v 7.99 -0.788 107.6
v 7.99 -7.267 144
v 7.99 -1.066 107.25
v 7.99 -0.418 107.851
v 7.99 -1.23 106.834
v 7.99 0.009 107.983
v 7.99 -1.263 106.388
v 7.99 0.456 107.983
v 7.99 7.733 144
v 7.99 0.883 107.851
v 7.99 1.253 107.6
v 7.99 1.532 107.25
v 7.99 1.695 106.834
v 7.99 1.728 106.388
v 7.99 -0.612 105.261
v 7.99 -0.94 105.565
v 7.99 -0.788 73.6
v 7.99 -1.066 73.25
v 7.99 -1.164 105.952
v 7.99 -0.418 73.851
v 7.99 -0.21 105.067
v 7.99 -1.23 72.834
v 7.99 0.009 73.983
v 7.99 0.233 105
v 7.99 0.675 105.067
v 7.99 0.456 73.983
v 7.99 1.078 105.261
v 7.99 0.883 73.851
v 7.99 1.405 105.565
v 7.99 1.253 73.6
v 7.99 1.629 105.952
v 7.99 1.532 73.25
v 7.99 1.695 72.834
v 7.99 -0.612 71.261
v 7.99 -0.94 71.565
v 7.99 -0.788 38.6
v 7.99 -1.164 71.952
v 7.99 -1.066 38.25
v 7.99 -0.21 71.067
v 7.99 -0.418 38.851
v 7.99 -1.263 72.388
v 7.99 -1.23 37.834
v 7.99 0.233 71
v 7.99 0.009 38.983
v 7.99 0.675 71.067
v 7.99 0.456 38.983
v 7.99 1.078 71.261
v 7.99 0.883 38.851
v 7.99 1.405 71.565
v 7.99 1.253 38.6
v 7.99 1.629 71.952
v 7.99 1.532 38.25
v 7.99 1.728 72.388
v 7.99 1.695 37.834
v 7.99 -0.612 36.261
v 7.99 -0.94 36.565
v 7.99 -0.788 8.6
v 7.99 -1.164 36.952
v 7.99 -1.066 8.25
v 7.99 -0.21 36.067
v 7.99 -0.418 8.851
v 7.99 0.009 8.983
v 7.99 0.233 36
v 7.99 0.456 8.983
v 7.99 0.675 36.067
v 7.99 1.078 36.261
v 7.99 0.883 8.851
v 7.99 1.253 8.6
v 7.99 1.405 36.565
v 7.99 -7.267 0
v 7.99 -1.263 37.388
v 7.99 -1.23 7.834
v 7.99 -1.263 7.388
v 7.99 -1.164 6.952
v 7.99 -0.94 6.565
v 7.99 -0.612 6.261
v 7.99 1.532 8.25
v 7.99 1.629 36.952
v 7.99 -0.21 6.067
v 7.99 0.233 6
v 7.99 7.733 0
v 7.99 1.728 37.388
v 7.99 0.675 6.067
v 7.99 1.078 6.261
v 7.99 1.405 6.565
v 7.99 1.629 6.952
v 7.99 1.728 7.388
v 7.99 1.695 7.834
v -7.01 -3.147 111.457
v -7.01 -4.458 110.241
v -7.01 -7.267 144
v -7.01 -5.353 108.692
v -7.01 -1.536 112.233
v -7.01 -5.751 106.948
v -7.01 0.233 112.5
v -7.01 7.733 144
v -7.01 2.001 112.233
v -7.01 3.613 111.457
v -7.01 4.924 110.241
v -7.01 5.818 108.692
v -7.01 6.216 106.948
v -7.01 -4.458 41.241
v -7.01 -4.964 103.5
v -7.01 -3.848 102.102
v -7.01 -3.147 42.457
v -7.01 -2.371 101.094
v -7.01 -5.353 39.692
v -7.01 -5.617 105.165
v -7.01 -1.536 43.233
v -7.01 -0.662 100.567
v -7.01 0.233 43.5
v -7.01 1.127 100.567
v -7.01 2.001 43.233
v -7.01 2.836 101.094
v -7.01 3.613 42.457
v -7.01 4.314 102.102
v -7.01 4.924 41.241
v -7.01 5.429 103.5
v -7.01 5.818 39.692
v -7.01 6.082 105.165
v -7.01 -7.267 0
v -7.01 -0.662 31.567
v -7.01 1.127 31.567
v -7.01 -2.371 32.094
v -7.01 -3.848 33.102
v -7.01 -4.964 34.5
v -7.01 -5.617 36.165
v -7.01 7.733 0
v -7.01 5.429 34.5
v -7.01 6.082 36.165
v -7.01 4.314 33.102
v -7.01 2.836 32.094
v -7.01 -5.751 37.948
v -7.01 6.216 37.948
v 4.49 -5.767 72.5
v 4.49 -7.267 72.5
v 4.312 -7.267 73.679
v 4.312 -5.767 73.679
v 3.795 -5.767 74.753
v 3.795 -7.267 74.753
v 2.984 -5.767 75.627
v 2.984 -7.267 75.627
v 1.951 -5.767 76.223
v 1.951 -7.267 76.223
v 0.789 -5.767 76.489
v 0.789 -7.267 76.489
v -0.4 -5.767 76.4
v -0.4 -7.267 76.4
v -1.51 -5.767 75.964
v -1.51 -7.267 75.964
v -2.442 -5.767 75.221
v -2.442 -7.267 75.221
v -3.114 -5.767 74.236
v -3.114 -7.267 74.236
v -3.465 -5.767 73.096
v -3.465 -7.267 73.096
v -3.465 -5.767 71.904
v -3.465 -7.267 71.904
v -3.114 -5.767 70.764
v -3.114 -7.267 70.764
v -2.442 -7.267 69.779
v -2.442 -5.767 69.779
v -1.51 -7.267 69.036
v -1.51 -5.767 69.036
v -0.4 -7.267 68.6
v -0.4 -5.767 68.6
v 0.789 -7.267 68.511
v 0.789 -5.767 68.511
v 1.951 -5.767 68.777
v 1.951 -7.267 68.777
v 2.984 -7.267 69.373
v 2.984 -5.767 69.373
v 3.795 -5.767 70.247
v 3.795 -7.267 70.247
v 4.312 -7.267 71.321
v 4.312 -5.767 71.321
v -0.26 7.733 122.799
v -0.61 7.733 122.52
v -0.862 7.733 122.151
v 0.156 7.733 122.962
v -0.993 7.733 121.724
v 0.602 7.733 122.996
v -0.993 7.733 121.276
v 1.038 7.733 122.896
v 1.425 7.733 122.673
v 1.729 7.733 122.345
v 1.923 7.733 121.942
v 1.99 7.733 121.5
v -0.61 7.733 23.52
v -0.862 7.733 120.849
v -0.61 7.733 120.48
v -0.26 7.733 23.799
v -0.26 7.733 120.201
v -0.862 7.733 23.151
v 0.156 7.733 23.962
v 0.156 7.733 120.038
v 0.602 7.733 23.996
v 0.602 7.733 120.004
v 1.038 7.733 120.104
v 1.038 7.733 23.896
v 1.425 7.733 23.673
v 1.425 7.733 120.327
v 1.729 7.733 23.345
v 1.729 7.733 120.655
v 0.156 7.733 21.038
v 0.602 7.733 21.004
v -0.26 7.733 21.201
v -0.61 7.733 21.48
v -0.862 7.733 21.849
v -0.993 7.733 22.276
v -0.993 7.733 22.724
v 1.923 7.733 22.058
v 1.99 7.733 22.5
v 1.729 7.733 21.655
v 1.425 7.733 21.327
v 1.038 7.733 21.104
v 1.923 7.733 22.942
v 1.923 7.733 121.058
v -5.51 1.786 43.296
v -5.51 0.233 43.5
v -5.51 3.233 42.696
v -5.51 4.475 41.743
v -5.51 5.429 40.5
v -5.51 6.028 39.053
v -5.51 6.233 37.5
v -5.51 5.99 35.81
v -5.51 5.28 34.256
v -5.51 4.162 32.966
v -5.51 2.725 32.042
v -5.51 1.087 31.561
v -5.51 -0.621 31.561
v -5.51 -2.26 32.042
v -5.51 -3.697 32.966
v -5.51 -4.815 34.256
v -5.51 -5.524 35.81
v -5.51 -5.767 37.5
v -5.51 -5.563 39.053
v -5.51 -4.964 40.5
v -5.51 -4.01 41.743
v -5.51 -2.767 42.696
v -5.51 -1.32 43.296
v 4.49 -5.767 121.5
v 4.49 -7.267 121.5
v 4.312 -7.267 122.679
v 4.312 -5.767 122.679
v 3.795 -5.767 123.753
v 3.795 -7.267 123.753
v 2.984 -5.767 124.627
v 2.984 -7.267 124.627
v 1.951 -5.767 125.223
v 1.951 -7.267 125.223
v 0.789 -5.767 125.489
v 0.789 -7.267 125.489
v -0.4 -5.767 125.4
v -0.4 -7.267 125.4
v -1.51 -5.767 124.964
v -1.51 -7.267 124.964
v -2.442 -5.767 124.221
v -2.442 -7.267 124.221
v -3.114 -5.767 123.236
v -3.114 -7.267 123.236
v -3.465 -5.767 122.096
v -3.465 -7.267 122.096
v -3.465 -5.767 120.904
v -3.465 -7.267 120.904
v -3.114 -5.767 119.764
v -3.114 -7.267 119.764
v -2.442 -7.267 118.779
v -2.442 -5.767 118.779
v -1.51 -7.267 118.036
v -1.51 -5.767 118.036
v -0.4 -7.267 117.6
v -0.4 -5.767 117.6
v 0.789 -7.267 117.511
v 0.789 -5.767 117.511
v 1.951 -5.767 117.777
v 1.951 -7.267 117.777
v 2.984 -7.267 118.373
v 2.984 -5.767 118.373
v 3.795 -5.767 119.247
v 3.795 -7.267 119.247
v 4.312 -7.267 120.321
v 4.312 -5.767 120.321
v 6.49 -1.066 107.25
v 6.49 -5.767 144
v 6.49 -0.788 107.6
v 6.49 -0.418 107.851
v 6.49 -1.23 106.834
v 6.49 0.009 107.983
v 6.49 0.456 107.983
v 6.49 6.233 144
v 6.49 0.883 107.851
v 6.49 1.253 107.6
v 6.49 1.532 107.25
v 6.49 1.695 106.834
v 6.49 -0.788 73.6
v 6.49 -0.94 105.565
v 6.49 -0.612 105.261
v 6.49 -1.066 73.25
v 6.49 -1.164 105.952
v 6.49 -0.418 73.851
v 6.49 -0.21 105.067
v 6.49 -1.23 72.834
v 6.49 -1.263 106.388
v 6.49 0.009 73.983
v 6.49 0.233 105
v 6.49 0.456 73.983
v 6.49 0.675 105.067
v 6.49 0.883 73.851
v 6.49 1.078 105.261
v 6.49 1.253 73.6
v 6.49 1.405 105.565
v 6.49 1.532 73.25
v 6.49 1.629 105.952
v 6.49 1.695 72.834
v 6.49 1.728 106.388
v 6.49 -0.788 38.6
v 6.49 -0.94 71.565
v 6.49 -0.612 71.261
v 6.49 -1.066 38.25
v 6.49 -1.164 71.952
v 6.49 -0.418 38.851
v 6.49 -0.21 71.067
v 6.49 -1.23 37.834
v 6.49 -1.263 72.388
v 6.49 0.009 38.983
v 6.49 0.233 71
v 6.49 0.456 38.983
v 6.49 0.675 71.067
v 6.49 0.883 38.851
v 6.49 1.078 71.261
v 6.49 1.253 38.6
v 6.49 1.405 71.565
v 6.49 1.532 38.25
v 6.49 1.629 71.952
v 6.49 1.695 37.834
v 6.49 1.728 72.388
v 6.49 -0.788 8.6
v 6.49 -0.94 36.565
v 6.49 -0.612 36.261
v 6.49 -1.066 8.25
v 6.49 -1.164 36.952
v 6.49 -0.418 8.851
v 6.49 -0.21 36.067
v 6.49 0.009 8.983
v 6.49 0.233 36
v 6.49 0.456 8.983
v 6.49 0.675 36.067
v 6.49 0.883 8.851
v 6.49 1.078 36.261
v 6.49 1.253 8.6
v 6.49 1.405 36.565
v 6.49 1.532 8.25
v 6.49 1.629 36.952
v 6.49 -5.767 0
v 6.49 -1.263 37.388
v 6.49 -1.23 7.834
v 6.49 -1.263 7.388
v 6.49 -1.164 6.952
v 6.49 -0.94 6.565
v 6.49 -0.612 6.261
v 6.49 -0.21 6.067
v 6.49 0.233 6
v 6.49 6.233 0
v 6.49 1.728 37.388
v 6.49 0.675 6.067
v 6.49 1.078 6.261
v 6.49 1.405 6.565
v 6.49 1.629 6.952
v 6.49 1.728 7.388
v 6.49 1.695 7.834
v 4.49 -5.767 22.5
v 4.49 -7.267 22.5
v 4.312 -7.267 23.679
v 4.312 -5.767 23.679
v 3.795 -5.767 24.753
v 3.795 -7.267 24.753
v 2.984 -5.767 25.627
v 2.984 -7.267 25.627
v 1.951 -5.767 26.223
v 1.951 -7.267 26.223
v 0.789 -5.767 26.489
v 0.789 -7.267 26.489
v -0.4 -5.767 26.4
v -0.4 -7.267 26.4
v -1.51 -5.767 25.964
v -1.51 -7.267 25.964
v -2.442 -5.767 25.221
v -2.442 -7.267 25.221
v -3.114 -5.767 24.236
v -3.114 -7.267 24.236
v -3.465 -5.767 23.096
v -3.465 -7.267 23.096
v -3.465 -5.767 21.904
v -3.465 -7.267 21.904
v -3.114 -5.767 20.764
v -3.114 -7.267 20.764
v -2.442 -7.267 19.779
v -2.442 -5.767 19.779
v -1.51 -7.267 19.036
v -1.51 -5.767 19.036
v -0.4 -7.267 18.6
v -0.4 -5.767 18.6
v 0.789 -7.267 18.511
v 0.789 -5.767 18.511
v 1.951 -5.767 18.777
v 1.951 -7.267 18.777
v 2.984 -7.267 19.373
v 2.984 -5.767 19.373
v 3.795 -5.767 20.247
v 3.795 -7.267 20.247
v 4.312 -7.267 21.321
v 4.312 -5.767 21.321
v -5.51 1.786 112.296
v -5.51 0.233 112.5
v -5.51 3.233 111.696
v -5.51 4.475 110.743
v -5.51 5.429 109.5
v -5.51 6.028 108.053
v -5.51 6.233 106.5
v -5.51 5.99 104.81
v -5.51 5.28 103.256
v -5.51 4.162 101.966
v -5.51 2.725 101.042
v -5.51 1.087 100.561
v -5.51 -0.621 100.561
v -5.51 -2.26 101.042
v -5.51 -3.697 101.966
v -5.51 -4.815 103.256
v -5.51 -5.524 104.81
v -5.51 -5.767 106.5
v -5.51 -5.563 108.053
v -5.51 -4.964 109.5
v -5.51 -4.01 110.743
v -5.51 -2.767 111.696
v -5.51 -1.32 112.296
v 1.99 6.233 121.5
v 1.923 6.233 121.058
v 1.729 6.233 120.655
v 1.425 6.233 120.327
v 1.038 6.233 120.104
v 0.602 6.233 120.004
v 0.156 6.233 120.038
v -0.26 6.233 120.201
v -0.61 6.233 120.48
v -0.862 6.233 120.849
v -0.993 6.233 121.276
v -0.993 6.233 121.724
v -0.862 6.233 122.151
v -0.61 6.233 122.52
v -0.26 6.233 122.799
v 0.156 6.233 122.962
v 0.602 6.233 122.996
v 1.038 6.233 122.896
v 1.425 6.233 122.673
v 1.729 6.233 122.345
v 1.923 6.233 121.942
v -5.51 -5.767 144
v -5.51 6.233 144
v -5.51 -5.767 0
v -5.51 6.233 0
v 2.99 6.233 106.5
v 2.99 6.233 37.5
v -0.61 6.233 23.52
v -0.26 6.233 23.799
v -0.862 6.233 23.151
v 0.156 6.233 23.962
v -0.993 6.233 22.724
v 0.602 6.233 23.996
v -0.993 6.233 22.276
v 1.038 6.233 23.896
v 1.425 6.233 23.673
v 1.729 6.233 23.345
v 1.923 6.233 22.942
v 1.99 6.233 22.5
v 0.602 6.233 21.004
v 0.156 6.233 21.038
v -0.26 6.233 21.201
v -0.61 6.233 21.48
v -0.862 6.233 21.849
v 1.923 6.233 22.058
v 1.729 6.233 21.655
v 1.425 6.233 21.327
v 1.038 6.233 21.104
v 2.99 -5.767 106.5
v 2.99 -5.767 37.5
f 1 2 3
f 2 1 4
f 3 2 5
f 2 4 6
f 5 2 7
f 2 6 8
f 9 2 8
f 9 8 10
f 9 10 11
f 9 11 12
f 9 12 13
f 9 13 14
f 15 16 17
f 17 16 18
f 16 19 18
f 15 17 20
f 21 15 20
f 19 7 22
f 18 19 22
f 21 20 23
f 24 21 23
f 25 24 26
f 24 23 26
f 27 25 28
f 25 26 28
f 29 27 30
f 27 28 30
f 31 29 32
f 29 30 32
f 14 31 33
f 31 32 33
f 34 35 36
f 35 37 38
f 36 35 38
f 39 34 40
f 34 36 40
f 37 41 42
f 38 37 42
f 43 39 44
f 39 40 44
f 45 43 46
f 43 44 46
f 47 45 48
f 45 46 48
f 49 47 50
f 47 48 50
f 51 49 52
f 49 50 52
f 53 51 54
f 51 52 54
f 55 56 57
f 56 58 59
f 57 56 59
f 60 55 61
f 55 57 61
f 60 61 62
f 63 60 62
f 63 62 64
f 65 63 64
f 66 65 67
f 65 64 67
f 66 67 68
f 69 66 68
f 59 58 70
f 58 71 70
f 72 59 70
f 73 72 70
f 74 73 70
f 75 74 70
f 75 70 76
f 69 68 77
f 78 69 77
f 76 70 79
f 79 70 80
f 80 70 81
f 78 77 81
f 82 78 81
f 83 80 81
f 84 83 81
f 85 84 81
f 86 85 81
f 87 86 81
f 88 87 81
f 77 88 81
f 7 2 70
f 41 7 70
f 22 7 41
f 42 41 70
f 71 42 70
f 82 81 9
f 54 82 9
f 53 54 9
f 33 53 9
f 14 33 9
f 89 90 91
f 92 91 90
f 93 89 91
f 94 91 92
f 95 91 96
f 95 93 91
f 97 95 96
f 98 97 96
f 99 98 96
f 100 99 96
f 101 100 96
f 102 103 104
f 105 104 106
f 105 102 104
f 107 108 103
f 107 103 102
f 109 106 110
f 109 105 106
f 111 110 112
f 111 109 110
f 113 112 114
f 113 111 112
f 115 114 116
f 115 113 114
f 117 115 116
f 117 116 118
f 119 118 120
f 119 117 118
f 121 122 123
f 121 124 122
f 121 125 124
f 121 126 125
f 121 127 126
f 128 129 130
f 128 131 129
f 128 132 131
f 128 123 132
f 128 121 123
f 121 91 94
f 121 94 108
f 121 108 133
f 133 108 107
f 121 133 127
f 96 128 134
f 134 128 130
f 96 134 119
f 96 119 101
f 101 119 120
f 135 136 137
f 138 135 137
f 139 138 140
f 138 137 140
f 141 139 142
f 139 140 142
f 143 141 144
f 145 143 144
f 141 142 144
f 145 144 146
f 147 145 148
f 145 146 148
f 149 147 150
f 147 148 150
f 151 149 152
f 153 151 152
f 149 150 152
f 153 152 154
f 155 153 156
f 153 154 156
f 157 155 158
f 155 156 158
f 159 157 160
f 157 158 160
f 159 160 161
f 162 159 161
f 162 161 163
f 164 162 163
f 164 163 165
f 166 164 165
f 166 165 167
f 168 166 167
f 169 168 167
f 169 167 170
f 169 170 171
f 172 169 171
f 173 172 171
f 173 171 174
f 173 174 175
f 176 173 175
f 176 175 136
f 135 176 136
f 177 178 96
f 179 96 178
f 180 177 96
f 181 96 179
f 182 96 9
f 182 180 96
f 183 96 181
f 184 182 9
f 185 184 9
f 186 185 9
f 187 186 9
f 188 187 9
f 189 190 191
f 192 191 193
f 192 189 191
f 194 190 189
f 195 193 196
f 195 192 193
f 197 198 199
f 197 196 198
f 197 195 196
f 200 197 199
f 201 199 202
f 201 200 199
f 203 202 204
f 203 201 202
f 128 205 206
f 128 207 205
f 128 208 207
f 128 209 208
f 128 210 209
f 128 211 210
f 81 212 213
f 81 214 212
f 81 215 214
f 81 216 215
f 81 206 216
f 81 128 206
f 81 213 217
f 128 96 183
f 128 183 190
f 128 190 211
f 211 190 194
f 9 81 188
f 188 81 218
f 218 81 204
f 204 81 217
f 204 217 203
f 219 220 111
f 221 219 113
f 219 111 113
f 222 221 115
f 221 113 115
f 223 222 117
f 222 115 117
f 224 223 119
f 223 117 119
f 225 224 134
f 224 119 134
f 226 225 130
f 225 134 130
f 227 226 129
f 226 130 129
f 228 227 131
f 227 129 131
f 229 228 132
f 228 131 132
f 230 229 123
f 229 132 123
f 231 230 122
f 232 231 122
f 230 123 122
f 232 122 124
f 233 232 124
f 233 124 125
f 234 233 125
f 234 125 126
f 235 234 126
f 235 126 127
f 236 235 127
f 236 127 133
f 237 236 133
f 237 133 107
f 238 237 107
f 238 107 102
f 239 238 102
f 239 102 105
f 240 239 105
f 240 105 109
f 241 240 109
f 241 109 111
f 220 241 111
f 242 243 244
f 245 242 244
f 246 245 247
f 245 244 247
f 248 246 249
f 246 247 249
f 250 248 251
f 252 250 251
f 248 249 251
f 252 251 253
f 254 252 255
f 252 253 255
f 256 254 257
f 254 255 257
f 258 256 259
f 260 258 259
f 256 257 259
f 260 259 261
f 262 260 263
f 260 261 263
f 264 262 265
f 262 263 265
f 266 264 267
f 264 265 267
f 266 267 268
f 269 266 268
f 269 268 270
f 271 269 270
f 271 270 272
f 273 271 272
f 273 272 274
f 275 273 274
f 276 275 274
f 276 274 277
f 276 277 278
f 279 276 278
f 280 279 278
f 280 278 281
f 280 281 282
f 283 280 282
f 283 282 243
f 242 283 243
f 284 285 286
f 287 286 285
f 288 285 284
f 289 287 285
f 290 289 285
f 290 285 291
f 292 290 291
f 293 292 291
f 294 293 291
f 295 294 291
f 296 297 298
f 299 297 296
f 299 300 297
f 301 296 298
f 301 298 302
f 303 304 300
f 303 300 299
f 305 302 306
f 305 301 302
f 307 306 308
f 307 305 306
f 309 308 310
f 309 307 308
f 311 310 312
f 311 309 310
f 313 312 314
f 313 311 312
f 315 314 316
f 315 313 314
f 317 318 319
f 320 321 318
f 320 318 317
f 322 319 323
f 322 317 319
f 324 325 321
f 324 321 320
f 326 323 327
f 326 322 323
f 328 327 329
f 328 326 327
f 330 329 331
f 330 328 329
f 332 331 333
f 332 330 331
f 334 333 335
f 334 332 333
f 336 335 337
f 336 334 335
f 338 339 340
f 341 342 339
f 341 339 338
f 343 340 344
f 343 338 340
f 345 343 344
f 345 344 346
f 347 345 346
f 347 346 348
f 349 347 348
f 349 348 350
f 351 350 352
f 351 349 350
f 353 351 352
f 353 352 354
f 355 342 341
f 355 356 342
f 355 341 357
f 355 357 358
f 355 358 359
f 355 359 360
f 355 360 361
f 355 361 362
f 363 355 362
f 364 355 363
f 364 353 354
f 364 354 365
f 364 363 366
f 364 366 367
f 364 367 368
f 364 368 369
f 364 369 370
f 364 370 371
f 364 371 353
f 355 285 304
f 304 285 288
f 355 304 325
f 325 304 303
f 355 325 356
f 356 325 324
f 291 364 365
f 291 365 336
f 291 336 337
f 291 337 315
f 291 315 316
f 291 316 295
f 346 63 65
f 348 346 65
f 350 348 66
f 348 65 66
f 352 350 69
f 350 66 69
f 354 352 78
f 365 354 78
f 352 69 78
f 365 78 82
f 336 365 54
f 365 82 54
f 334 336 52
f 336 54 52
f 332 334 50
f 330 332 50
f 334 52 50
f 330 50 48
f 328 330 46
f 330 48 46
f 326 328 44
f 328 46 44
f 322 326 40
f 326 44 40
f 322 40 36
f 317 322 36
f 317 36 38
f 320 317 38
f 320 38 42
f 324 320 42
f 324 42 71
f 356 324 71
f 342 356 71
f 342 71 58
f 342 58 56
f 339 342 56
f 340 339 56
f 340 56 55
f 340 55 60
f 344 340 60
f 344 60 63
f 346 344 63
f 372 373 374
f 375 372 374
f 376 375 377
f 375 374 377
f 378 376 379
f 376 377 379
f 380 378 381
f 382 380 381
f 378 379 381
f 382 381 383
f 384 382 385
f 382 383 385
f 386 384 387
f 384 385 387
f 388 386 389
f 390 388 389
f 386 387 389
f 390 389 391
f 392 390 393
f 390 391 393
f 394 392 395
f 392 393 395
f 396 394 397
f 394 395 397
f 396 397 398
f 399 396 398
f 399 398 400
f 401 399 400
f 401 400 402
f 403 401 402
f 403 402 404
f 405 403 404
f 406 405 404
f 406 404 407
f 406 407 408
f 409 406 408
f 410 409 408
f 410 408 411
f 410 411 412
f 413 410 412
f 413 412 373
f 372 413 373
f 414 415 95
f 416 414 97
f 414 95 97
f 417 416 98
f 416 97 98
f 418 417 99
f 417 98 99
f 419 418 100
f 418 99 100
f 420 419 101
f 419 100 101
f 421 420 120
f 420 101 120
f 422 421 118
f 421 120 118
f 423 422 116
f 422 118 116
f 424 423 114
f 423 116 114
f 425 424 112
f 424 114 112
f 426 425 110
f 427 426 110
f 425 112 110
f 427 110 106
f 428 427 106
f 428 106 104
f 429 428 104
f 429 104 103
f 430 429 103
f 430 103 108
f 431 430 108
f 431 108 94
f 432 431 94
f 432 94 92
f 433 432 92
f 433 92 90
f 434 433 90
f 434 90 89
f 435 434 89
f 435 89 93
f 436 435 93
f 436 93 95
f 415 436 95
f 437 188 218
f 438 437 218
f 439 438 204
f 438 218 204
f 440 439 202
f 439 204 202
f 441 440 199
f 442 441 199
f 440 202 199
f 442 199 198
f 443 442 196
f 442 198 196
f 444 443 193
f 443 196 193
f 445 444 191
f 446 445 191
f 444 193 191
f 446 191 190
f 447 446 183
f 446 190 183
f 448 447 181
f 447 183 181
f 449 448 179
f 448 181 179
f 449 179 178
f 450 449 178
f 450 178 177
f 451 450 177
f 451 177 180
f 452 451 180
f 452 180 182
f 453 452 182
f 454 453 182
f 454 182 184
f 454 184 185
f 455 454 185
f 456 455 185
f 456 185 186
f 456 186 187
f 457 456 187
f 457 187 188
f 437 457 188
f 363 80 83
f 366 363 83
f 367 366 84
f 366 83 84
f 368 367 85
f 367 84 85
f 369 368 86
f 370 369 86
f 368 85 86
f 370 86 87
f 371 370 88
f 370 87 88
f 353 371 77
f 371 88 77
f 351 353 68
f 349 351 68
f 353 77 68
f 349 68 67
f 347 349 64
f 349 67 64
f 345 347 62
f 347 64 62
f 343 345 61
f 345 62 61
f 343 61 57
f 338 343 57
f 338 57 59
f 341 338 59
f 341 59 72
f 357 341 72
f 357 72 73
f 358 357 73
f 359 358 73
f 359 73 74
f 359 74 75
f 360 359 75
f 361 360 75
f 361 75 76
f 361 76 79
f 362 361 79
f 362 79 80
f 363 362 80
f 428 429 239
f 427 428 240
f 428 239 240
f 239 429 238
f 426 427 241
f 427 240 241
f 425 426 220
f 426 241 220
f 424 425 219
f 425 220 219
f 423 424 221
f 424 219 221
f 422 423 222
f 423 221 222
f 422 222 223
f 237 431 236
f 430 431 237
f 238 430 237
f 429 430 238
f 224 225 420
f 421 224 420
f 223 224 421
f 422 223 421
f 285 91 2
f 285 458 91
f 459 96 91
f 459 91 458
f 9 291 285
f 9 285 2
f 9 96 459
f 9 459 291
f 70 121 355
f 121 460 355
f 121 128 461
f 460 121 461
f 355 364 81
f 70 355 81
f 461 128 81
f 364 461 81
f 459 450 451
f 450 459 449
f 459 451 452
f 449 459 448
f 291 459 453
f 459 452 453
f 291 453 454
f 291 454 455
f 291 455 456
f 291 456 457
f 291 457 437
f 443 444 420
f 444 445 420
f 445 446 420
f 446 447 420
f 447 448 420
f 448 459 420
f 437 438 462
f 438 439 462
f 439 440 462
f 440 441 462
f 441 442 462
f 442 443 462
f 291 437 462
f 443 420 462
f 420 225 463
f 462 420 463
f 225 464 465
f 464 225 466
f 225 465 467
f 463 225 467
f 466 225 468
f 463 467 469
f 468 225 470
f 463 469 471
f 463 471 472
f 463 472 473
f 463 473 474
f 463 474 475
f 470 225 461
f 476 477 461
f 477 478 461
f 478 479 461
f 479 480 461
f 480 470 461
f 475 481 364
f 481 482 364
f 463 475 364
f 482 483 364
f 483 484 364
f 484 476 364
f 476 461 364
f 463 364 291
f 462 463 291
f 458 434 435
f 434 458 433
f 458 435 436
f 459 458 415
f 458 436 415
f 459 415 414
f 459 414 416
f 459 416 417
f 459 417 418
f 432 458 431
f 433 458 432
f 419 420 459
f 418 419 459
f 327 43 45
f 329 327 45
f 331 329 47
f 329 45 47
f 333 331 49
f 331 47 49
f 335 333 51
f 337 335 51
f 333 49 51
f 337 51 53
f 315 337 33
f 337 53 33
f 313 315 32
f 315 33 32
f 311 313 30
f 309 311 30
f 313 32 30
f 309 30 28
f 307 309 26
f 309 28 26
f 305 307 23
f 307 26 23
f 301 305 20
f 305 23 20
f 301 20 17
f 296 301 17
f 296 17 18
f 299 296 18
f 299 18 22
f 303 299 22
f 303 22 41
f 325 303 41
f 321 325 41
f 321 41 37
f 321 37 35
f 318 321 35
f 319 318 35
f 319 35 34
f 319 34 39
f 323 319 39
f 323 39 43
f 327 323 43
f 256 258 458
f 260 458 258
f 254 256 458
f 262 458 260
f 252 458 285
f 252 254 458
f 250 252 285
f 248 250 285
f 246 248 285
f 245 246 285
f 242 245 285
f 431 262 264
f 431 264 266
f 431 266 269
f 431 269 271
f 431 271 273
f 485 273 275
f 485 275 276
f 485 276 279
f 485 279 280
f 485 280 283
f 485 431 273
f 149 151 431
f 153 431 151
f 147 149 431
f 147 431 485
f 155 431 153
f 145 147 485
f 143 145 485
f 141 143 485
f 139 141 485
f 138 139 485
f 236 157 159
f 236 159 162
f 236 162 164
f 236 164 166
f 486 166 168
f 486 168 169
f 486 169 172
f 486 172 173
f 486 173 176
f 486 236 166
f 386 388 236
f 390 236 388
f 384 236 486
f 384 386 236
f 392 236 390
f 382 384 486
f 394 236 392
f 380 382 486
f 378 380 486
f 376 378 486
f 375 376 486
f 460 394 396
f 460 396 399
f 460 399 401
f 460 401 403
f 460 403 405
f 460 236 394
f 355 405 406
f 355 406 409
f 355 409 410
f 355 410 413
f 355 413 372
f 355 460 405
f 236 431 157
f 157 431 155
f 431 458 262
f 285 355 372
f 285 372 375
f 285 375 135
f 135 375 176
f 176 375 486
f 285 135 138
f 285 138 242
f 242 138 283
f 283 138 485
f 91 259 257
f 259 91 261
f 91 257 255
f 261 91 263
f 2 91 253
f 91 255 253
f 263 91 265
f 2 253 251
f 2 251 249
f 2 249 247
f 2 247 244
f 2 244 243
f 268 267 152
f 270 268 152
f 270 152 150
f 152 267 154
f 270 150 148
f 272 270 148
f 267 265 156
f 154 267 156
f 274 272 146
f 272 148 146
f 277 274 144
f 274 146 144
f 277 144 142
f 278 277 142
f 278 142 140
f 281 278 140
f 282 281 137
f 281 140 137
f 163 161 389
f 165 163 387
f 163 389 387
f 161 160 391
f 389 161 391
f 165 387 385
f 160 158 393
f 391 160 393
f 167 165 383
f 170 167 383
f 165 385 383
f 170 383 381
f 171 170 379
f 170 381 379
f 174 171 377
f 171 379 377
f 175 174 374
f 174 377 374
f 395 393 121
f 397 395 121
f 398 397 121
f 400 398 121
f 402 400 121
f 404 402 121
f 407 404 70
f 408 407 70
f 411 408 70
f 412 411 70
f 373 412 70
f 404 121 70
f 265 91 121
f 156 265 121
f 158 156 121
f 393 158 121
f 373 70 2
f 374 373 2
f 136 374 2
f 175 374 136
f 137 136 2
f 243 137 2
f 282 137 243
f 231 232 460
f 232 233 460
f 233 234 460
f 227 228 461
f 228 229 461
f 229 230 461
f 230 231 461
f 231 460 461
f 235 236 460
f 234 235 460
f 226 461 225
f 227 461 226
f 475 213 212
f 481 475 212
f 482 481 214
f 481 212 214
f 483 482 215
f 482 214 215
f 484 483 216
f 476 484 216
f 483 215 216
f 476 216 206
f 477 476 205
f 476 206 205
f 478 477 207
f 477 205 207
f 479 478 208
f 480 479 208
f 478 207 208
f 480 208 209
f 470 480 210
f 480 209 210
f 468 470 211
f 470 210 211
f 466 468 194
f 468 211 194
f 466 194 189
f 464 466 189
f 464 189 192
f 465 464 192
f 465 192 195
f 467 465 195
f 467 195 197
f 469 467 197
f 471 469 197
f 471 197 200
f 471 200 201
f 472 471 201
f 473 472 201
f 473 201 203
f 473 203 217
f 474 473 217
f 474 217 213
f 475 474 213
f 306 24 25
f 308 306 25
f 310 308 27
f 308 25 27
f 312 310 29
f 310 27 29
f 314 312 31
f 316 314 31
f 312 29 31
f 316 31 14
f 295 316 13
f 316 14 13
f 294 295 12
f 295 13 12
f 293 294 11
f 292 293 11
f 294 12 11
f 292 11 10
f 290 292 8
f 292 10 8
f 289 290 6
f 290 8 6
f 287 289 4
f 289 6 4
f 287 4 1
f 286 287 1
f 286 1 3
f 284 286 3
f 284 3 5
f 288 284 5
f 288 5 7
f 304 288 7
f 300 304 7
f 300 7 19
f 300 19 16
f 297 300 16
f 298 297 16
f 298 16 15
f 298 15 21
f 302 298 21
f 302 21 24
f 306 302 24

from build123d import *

# Parameters (mm, degrees)
SKETCH_1_W           = 15
SKETCH_1_H           = 15
SKETCH_1_W_2         = 12
SKETCH_1_H_2         = 12
EXTRUDE_2_DEPTH      = 144
SKETCH_3_R           = 1.5
CUT_EXTRUDE_2_DEPTH  = 10
SKETCH_4_R           = 1.5
CUT_EXTRUDE_4_DEPTH  = 10
SKETCH_7_R           = 4
CUT_EXTRUDE_6_DEPTH  = 10
SKETCH_8_R           = 4
CUT_EXTRUDE_7_DEPTH  = 10
SKETCH_9_R           = 6
CUT_EXTRUDE_8_DEPTH  = 10
SKETCH_10_R          = 1.5
CUT_EXTRUDE_9_DEPTH  = 10
SKETCH_11_R          = 4
CUT_EXTRUDE_10_DEPTH = 10
SKETCH_12_R          = 6
CUT_EXTRUDE_11_DEPTH = 10
SKETCH_13_R          = 1.5
CUT_EXTRUDE_12_DEPTH = 10
SKETCH_14_R          = 1.5
CUT_EXTRUDE_13_DEPTH = 10
SKETCH_15_R          = 1.5
CUT_EXTRUDE_14_DEPTH = 10


with BuildPart() as part:
    # ｽｹｯﾁ1 → ﾎﾞｽ - 押し出し2 (new body)
    with BuildSketch(Plane.XY):
        with Locations((0.489915859, 0.232626086)):
            Rectangle(SKETCH_1_W, SKETCH_1_H)
        with Locations((0.489915859, 0.232626086)):
            Rectangle(SKETCH_1_W_2, SKETCH_1_H_2, mode=Mode.SUBTRACT)
    extrude(amount=EXTRUDE_2_DEPTH)

    # ｽｹｯﾁ3 → ｶｯﾄ - 押し出し2 (cut)
    with BuildSketch(Plane(origin=(0, 7.732626086, 0), x_dir=(1, 0, 0), z_dir=(0, 1, 0))):
        with Locations((0.489915859, -22.5)):
            Circle(SKETCH_3_R)
    extrude(amount=-CUT_EXTRUDE_2_DEPTH, mode=Mode.SUBTRACT)

    # ｽｹｯﾁ4 → ｶｯﾄ - 押し出し4 (cut)
    with BuildSketch(Plane(origin=(0, 7.732626086, 0), x_dir=(1, 0, 0), z_dir=(0, 1, 0))):
        with Locations((0.489915859, -121.5)):
            Circle(SKETCH_4_R)
    extrude(amount=-CUT_EXTRUDE_4_DEPTH, mode=Mode.SUBTRACT)

    # ｽｹｯﾁ7 → ｶｯﾄ - 押し出し6 (cut)
    with BuildSketch(Plane.XZ.offset(7.267373914)):
        with Locations((0.489915859, 22.5)):
            Circle(SKETCH_7_R)
    extrude(amount=-CUT_EXTRUDE_6_DEPTH, mode=Mode.SUBTRACT)

    # ｽｹｯﾁ8 → ｶｯﾄ - 押し出し7 (cut)
    with BuildSketch(Plane.XZ.offset(7.267373914)):
        with Locations((0.489915859, 121.5)):
            Circle(SKETCH_8_R)
    extrude(amount=-CUT_EXTRUDE_7_DEPTH, mode=Mode.SUBTRACT)

    # ｽｹｯﾁ9 → ｶｯﾄ - 押し出し8 (cut)
    with BuildSketch(Plane.ZY.offset(7.010084141)):
        with Locations((37.5, 0.232626086)):
            Circle(SKETCH_9_R)
    extrude(amount=-CUT_EXTRUDE_8_DEPTH, mode=Mode.SUBTRACT)

    # ｽｹｯﾁ10 → ｶｯﾄ - 押し出し9 (cut)
    with BuildSketch(Plane(origin=(7.989915859, 0, 0), x_dir=(0, 0, -1), z_dir=(1, 0, 0))):
        with Locations((-37.5, 0.232626086)):
            Circle(SKETCH_10_R)
    extrude(amount=-CUT_EXTRUDE_9_DEPTH, mode=Mode.SUBTRACT)

    # ｽｹｯﾁ11 → ｶｯﾄ - 押し出し10 (cut)
    with BuildSketch(Plane.XZ.offset(7.267373914)):
        with Locations((0.489915859, 72.5)):
            Circle(SKETCH_11_R)
    extrude(amount=-CUT_EXTRUDE_10_DEPTH, mode=Mode.SUBTRACT)

    # ｽｹｯﾁ12 → ｶｯﾄ - 押し出し11 (cut)
    with BuildSketch(Plane.ZY.offset(7.010084141)):
        with Locations((106.5, 0.232626086)):
            Circle(SKETCH_12_R)
    extrude(amount=-CUT_EXTRUDE_11_DEPTH, mode=Mode.SUBTRACT)

    # ｽｹｯﾁ13 → ｶｯﾄ - 押し出し12 (cut)
    with BuildSketch(Plane(origin=(7.989915859, 0, 0), x_dir=(0, 0, -1), z_dir=(1, 0, 0))):
        with Locations((-106.5, 0.232626086)):
            Circle(SKETCH_13_R)
    extrude(amount=-CUT_EXTRUDE_12_DEPTH, mode=Mode.SUBTRACT)

    # ｽｹｯﾁ14 → ｶｯﾄ - 押し出し13 (cut)
    with BuildSketch(Plane(origin=(7.989915859, 0, 0), x_dir=(0, 0, -1), z_dir=(1, 0, 0))):
        with Locations((-7.5, 0.232626086)):
            Circle(SKETCH_14_R)
    extrude(amount=-CUT_EXTRUDE_13_DEPTH, mode=Mode.SUBTRACT)

    # ｽｹｯﾁ15 → ｶｯﾄ - 押し出し14 (cut)
    with BuildSketch(Plane(origin=(7.989915859, 0, 0), x_dir=(0, 0, -1), z_dir=(1, 0, 0))):
        with Locations((-72.5, 0.232626086)):
            Circle(SKETCH_15_R)
    extrude(amount=-CUT_EXTRUDE_14_DEPTH, mode=Mode.SUBTRACT)


solid = part.part
